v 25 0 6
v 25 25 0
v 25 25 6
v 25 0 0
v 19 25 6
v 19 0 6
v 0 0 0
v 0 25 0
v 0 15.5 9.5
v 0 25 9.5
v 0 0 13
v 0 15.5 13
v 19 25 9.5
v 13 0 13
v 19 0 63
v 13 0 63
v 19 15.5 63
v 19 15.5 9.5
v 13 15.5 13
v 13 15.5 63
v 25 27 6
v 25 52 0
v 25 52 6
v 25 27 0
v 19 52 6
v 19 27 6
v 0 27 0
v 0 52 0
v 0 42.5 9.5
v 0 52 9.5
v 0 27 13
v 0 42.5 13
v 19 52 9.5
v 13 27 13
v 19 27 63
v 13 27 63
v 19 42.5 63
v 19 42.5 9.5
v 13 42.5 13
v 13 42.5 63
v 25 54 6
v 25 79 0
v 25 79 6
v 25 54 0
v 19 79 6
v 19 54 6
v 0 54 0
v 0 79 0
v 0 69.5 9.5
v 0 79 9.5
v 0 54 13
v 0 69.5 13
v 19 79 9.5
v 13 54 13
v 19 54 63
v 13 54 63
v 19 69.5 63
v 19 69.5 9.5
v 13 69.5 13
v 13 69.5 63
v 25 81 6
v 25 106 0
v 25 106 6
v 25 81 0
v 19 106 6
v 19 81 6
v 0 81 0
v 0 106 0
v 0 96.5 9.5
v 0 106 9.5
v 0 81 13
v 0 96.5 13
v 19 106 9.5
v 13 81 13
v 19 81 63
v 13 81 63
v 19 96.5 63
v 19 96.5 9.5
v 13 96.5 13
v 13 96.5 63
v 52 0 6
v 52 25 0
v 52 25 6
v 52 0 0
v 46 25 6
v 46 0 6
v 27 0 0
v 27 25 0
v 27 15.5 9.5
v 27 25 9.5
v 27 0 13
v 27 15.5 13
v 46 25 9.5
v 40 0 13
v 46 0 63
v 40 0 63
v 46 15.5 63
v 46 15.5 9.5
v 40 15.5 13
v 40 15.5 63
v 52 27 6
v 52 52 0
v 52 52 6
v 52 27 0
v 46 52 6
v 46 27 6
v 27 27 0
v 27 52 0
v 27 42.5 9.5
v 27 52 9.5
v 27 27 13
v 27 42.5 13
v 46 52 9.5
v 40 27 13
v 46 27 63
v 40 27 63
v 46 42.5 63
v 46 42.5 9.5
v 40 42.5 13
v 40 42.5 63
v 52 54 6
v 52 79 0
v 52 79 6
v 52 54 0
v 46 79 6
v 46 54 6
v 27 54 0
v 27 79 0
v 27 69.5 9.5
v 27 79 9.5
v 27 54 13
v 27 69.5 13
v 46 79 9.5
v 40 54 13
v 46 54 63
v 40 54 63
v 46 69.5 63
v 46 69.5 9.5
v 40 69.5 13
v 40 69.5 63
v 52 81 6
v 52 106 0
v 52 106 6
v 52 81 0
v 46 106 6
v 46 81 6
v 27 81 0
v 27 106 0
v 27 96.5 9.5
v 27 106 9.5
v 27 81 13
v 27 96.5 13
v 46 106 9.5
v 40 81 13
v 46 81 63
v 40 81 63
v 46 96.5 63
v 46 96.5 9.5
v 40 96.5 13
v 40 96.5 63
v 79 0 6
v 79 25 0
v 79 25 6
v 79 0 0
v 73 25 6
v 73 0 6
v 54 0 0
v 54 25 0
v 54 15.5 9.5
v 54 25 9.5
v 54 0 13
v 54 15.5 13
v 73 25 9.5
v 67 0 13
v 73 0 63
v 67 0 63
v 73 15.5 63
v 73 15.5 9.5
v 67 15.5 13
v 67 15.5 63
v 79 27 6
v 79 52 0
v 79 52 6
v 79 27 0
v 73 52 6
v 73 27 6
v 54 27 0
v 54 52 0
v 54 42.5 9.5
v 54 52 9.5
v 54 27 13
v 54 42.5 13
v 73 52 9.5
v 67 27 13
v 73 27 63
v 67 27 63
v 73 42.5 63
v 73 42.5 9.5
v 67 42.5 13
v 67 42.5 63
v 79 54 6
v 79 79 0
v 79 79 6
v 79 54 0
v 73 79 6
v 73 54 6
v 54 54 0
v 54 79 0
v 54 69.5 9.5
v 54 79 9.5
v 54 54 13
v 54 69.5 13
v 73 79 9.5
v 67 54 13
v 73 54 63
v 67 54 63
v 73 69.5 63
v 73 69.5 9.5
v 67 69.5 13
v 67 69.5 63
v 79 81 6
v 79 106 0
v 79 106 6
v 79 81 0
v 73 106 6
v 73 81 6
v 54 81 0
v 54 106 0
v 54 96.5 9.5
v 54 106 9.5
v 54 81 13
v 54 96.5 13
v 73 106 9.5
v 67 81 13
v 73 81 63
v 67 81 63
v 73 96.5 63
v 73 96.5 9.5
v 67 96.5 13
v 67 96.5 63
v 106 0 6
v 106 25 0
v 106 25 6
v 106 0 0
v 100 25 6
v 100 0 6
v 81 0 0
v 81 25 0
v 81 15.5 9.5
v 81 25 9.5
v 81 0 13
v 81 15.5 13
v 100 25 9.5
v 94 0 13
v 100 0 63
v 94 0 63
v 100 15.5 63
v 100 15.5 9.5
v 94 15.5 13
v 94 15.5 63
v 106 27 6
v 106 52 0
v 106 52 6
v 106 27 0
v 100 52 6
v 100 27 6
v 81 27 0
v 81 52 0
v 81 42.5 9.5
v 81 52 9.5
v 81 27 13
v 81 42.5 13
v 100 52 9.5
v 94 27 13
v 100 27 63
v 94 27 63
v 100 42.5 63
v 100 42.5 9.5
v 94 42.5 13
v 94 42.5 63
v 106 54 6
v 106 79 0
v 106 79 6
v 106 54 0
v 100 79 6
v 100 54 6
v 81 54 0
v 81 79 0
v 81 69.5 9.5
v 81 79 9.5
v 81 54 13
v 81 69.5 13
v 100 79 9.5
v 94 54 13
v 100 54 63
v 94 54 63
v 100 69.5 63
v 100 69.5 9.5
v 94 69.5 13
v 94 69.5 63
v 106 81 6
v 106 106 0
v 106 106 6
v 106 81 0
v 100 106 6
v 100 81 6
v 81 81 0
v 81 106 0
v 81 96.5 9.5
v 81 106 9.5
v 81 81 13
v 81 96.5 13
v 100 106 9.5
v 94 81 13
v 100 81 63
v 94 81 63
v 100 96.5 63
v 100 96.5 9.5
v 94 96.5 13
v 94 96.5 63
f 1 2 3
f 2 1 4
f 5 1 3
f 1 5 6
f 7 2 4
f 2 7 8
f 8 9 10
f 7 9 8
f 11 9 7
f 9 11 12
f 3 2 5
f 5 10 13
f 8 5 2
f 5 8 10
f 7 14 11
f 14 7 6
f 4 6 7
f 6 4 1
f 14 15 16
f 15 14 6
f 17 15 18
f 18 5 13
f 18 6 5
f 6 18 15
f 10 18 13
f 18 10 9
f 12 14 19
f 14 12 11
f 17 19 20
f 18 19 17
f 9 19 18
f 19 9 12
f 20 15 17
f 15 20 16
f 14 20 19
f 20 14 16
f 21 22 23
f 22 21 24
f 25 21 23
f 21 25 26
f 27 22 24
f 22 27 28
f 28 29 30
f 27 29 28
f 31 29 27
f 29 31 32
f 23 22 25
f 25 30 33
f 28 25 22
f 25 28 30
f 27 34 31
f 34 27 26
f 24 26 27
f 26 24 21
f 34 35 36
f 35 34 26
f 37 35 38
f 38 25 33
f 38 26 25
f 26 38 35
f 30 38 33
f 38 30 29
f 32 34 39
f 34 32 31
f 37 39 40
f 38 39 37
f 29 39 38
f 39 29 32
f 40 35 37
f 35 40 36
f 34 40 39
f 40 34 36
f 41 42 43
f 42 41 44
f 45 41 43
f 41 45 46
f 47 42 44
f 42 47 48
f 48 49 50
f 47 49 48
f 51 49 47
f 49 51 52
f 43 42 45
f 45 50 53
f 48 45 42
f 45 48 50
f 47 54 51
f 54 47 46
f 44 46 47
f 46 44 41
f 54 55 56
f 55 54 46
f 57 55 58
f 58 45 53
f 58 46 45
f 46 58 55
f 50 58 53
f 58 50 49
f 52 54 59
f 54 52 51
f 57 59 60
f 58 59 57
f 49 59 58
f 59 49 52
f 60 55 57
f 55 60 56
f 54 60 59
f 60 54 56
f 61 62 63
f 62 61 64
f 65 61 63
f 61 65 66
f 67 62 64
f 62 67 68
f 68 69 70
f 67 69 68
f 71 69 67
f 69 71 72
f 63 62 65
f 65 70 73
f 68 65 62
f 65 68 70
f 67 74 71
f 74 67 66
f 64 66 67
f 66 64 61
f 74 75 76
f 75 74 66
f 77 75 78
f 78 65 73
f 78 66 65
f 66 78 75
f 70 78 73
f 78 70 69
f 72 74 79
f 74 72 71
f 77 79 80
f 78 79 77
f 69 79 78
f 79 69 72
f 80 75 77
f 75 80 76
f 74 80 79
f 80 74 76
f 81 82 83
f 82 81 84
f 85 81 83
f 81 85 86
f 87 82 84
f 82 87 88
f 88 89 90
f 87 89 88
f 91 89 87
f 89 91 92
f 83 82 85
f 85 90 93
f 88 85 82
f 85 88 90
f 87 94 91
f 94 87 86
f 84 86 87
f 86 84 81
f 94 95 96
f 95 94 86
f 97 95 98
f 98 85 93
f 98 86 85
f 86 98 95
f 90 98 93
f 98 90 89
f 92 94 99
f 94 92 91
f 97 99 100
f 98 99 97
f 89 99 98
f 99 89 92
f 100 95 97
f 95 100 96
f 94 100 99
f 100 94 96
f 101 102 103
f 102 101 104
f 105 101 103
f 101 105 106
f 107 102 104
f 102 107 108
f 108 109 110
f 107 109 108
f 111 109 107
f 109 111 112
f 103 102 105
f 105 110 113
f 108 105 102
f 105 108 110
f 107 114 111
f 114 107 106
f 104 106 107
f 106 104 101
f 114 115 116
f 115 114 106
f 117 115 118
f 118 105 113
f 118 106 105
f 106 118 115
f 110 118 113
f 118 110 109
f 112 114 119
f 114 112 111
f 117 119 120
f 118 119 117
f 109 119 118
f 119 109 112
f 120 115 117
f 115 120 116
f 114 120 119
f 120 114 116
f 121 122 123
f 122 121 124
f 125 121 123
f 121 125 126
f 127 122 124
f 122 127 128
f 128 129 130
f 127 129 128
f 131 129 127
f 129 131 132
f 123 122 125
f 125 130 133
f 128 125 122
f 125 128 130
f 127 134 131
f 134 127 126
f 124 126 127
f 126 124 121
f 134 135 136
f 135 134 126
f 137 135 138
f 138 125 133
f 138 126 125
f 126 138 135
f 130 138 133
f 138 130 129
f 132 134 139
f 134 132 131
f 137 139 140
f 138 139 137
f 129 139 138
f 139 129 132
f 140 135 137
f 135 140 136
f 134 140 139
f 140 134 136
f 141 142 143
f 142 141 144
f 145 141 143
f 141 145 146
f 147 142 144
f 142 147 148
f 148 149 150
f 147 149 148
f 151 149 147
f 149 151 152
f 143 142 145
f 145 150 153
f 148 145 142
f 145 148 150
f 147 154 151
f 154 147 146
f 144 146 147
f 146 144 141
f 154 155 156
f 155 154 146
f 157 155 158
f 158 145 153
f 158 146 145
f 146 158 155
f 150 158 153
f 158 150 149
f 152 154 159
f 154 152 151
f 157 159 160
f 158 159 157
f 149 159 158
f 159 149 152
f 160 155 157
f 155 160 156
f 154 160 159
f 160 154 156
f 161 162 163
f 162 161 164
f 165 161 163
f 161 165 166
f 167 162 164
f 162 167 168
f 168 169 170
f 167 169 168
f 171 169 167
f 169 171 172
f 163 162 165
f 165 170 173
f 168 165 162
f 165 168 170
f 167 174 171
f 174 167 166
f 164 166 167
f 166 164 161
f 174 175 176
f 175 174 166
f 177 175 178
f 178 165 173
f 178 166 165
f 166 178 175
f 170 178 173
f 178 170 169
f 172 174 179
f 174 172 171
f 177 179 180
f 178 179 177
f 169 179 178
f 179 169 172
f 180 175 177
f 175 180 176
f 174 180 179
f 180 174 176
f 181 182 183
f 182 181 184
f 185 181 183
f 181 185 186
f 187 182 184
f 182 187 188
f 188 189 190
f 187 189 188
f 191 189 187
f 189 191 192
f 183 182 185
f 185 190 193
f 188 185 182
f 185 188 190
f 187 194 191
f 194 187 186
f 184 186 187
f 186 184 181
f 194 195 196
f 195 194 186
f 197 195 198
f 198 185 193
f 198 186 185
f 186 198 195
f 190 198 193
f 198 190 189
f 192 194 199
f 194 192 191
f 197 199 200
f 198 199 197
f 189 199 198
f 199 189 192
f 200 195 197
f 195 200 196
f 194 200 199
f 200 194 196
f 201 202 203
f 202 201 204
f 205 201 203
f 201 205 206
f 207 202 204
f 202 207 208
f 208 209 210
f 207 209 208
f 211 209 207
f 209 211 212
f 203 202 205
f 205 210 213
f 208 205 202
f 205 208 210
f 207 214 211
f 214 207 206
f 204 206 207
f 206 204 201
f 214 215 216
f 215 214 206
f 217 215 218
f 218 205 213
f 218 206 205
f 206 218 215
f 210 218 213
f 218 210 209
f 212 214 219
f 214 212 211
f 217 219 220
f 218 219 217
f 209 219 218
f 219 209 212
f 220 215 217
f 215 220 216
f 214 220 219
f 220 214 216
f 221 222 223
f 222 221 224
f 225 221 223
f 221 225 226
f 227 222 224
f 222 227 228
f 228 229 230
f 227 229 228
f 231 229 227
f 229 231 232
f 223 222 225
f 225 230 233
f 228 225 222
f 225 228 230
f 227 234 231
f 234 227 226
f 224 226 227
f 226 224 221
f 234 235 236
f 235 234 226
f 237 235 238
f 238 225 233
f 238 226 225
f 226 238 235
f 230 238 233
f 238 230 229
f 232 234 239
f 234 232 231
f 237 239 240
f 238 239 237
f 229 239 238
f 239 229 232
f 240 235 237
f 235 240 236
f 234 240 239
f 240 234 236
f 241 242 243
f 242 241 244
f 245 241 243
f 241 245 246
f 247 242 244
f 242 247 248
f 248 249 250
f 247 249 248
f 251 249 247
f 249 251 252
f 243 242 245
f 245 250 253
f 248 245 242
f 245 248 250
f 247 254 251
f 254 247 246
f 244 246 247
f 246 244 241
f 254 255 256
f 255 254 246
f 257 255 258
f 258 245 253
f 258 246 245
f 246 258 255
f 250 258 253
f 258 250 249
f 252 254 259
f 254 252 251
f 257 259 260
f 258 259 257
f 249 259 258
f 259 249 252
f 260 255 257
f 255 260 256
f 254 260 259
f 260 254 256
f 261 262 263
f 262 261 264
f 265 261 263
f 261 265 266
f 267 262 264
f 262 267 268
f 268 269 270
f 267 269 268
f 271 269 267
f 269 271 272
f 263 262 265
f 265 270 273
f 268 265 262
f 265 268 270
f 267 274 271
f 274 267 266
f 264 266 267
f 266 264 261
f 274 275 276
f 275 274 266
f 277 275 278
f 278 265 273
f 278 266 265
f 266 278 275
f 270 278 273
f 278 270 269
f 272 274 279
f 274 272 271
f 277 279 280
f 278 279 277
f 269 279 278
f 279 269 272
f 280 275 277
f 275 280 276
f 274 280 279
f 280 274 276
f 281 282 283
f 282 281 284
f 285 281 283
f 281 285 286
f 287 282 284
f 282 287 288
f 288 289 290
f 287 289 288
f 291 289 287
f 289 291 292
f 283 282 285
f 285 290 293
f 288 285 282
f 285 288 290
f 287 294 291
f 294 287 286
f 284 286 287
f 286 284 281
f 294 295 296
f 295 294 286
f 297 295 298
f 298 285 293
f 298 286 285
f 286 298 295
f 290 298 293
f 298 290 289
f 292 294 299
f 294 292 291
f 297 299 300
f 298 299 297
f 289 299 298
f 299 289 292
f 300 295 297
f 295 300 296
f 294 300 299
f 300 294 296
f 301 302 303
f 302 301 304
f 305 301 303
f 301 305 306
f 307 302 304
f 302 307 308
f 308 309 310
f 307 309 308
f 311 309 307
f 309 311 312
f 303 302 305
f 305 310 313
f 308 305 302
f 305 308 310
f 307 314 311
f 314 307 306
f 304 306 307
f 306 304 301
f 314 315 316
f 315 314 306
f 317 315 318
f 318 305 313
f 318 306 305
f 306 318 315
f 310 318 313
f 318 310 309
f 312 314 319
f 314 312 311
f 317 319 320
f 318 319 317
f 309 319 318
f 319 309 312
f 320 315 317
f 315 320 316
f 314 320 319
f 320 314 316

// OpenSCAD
e = .1;

module spacer(h1, h2, h3, base, h_hand){
    cube([base,base,h1], center=false);
    cube([base-h1,base,h2], center=false);
    cube([base-h1,base-h2,h3], center=false);
    translate([h3,0,0]) cube([base-h1-h3,base-h2,h3+h_hand], center=false);
}

for( x = [0:3] ) {
    for( y = [0:3] ) {
        translate([27*x,27*y,0])
            spacer(6, 9.5, 13, 25, 50);
    }
}
